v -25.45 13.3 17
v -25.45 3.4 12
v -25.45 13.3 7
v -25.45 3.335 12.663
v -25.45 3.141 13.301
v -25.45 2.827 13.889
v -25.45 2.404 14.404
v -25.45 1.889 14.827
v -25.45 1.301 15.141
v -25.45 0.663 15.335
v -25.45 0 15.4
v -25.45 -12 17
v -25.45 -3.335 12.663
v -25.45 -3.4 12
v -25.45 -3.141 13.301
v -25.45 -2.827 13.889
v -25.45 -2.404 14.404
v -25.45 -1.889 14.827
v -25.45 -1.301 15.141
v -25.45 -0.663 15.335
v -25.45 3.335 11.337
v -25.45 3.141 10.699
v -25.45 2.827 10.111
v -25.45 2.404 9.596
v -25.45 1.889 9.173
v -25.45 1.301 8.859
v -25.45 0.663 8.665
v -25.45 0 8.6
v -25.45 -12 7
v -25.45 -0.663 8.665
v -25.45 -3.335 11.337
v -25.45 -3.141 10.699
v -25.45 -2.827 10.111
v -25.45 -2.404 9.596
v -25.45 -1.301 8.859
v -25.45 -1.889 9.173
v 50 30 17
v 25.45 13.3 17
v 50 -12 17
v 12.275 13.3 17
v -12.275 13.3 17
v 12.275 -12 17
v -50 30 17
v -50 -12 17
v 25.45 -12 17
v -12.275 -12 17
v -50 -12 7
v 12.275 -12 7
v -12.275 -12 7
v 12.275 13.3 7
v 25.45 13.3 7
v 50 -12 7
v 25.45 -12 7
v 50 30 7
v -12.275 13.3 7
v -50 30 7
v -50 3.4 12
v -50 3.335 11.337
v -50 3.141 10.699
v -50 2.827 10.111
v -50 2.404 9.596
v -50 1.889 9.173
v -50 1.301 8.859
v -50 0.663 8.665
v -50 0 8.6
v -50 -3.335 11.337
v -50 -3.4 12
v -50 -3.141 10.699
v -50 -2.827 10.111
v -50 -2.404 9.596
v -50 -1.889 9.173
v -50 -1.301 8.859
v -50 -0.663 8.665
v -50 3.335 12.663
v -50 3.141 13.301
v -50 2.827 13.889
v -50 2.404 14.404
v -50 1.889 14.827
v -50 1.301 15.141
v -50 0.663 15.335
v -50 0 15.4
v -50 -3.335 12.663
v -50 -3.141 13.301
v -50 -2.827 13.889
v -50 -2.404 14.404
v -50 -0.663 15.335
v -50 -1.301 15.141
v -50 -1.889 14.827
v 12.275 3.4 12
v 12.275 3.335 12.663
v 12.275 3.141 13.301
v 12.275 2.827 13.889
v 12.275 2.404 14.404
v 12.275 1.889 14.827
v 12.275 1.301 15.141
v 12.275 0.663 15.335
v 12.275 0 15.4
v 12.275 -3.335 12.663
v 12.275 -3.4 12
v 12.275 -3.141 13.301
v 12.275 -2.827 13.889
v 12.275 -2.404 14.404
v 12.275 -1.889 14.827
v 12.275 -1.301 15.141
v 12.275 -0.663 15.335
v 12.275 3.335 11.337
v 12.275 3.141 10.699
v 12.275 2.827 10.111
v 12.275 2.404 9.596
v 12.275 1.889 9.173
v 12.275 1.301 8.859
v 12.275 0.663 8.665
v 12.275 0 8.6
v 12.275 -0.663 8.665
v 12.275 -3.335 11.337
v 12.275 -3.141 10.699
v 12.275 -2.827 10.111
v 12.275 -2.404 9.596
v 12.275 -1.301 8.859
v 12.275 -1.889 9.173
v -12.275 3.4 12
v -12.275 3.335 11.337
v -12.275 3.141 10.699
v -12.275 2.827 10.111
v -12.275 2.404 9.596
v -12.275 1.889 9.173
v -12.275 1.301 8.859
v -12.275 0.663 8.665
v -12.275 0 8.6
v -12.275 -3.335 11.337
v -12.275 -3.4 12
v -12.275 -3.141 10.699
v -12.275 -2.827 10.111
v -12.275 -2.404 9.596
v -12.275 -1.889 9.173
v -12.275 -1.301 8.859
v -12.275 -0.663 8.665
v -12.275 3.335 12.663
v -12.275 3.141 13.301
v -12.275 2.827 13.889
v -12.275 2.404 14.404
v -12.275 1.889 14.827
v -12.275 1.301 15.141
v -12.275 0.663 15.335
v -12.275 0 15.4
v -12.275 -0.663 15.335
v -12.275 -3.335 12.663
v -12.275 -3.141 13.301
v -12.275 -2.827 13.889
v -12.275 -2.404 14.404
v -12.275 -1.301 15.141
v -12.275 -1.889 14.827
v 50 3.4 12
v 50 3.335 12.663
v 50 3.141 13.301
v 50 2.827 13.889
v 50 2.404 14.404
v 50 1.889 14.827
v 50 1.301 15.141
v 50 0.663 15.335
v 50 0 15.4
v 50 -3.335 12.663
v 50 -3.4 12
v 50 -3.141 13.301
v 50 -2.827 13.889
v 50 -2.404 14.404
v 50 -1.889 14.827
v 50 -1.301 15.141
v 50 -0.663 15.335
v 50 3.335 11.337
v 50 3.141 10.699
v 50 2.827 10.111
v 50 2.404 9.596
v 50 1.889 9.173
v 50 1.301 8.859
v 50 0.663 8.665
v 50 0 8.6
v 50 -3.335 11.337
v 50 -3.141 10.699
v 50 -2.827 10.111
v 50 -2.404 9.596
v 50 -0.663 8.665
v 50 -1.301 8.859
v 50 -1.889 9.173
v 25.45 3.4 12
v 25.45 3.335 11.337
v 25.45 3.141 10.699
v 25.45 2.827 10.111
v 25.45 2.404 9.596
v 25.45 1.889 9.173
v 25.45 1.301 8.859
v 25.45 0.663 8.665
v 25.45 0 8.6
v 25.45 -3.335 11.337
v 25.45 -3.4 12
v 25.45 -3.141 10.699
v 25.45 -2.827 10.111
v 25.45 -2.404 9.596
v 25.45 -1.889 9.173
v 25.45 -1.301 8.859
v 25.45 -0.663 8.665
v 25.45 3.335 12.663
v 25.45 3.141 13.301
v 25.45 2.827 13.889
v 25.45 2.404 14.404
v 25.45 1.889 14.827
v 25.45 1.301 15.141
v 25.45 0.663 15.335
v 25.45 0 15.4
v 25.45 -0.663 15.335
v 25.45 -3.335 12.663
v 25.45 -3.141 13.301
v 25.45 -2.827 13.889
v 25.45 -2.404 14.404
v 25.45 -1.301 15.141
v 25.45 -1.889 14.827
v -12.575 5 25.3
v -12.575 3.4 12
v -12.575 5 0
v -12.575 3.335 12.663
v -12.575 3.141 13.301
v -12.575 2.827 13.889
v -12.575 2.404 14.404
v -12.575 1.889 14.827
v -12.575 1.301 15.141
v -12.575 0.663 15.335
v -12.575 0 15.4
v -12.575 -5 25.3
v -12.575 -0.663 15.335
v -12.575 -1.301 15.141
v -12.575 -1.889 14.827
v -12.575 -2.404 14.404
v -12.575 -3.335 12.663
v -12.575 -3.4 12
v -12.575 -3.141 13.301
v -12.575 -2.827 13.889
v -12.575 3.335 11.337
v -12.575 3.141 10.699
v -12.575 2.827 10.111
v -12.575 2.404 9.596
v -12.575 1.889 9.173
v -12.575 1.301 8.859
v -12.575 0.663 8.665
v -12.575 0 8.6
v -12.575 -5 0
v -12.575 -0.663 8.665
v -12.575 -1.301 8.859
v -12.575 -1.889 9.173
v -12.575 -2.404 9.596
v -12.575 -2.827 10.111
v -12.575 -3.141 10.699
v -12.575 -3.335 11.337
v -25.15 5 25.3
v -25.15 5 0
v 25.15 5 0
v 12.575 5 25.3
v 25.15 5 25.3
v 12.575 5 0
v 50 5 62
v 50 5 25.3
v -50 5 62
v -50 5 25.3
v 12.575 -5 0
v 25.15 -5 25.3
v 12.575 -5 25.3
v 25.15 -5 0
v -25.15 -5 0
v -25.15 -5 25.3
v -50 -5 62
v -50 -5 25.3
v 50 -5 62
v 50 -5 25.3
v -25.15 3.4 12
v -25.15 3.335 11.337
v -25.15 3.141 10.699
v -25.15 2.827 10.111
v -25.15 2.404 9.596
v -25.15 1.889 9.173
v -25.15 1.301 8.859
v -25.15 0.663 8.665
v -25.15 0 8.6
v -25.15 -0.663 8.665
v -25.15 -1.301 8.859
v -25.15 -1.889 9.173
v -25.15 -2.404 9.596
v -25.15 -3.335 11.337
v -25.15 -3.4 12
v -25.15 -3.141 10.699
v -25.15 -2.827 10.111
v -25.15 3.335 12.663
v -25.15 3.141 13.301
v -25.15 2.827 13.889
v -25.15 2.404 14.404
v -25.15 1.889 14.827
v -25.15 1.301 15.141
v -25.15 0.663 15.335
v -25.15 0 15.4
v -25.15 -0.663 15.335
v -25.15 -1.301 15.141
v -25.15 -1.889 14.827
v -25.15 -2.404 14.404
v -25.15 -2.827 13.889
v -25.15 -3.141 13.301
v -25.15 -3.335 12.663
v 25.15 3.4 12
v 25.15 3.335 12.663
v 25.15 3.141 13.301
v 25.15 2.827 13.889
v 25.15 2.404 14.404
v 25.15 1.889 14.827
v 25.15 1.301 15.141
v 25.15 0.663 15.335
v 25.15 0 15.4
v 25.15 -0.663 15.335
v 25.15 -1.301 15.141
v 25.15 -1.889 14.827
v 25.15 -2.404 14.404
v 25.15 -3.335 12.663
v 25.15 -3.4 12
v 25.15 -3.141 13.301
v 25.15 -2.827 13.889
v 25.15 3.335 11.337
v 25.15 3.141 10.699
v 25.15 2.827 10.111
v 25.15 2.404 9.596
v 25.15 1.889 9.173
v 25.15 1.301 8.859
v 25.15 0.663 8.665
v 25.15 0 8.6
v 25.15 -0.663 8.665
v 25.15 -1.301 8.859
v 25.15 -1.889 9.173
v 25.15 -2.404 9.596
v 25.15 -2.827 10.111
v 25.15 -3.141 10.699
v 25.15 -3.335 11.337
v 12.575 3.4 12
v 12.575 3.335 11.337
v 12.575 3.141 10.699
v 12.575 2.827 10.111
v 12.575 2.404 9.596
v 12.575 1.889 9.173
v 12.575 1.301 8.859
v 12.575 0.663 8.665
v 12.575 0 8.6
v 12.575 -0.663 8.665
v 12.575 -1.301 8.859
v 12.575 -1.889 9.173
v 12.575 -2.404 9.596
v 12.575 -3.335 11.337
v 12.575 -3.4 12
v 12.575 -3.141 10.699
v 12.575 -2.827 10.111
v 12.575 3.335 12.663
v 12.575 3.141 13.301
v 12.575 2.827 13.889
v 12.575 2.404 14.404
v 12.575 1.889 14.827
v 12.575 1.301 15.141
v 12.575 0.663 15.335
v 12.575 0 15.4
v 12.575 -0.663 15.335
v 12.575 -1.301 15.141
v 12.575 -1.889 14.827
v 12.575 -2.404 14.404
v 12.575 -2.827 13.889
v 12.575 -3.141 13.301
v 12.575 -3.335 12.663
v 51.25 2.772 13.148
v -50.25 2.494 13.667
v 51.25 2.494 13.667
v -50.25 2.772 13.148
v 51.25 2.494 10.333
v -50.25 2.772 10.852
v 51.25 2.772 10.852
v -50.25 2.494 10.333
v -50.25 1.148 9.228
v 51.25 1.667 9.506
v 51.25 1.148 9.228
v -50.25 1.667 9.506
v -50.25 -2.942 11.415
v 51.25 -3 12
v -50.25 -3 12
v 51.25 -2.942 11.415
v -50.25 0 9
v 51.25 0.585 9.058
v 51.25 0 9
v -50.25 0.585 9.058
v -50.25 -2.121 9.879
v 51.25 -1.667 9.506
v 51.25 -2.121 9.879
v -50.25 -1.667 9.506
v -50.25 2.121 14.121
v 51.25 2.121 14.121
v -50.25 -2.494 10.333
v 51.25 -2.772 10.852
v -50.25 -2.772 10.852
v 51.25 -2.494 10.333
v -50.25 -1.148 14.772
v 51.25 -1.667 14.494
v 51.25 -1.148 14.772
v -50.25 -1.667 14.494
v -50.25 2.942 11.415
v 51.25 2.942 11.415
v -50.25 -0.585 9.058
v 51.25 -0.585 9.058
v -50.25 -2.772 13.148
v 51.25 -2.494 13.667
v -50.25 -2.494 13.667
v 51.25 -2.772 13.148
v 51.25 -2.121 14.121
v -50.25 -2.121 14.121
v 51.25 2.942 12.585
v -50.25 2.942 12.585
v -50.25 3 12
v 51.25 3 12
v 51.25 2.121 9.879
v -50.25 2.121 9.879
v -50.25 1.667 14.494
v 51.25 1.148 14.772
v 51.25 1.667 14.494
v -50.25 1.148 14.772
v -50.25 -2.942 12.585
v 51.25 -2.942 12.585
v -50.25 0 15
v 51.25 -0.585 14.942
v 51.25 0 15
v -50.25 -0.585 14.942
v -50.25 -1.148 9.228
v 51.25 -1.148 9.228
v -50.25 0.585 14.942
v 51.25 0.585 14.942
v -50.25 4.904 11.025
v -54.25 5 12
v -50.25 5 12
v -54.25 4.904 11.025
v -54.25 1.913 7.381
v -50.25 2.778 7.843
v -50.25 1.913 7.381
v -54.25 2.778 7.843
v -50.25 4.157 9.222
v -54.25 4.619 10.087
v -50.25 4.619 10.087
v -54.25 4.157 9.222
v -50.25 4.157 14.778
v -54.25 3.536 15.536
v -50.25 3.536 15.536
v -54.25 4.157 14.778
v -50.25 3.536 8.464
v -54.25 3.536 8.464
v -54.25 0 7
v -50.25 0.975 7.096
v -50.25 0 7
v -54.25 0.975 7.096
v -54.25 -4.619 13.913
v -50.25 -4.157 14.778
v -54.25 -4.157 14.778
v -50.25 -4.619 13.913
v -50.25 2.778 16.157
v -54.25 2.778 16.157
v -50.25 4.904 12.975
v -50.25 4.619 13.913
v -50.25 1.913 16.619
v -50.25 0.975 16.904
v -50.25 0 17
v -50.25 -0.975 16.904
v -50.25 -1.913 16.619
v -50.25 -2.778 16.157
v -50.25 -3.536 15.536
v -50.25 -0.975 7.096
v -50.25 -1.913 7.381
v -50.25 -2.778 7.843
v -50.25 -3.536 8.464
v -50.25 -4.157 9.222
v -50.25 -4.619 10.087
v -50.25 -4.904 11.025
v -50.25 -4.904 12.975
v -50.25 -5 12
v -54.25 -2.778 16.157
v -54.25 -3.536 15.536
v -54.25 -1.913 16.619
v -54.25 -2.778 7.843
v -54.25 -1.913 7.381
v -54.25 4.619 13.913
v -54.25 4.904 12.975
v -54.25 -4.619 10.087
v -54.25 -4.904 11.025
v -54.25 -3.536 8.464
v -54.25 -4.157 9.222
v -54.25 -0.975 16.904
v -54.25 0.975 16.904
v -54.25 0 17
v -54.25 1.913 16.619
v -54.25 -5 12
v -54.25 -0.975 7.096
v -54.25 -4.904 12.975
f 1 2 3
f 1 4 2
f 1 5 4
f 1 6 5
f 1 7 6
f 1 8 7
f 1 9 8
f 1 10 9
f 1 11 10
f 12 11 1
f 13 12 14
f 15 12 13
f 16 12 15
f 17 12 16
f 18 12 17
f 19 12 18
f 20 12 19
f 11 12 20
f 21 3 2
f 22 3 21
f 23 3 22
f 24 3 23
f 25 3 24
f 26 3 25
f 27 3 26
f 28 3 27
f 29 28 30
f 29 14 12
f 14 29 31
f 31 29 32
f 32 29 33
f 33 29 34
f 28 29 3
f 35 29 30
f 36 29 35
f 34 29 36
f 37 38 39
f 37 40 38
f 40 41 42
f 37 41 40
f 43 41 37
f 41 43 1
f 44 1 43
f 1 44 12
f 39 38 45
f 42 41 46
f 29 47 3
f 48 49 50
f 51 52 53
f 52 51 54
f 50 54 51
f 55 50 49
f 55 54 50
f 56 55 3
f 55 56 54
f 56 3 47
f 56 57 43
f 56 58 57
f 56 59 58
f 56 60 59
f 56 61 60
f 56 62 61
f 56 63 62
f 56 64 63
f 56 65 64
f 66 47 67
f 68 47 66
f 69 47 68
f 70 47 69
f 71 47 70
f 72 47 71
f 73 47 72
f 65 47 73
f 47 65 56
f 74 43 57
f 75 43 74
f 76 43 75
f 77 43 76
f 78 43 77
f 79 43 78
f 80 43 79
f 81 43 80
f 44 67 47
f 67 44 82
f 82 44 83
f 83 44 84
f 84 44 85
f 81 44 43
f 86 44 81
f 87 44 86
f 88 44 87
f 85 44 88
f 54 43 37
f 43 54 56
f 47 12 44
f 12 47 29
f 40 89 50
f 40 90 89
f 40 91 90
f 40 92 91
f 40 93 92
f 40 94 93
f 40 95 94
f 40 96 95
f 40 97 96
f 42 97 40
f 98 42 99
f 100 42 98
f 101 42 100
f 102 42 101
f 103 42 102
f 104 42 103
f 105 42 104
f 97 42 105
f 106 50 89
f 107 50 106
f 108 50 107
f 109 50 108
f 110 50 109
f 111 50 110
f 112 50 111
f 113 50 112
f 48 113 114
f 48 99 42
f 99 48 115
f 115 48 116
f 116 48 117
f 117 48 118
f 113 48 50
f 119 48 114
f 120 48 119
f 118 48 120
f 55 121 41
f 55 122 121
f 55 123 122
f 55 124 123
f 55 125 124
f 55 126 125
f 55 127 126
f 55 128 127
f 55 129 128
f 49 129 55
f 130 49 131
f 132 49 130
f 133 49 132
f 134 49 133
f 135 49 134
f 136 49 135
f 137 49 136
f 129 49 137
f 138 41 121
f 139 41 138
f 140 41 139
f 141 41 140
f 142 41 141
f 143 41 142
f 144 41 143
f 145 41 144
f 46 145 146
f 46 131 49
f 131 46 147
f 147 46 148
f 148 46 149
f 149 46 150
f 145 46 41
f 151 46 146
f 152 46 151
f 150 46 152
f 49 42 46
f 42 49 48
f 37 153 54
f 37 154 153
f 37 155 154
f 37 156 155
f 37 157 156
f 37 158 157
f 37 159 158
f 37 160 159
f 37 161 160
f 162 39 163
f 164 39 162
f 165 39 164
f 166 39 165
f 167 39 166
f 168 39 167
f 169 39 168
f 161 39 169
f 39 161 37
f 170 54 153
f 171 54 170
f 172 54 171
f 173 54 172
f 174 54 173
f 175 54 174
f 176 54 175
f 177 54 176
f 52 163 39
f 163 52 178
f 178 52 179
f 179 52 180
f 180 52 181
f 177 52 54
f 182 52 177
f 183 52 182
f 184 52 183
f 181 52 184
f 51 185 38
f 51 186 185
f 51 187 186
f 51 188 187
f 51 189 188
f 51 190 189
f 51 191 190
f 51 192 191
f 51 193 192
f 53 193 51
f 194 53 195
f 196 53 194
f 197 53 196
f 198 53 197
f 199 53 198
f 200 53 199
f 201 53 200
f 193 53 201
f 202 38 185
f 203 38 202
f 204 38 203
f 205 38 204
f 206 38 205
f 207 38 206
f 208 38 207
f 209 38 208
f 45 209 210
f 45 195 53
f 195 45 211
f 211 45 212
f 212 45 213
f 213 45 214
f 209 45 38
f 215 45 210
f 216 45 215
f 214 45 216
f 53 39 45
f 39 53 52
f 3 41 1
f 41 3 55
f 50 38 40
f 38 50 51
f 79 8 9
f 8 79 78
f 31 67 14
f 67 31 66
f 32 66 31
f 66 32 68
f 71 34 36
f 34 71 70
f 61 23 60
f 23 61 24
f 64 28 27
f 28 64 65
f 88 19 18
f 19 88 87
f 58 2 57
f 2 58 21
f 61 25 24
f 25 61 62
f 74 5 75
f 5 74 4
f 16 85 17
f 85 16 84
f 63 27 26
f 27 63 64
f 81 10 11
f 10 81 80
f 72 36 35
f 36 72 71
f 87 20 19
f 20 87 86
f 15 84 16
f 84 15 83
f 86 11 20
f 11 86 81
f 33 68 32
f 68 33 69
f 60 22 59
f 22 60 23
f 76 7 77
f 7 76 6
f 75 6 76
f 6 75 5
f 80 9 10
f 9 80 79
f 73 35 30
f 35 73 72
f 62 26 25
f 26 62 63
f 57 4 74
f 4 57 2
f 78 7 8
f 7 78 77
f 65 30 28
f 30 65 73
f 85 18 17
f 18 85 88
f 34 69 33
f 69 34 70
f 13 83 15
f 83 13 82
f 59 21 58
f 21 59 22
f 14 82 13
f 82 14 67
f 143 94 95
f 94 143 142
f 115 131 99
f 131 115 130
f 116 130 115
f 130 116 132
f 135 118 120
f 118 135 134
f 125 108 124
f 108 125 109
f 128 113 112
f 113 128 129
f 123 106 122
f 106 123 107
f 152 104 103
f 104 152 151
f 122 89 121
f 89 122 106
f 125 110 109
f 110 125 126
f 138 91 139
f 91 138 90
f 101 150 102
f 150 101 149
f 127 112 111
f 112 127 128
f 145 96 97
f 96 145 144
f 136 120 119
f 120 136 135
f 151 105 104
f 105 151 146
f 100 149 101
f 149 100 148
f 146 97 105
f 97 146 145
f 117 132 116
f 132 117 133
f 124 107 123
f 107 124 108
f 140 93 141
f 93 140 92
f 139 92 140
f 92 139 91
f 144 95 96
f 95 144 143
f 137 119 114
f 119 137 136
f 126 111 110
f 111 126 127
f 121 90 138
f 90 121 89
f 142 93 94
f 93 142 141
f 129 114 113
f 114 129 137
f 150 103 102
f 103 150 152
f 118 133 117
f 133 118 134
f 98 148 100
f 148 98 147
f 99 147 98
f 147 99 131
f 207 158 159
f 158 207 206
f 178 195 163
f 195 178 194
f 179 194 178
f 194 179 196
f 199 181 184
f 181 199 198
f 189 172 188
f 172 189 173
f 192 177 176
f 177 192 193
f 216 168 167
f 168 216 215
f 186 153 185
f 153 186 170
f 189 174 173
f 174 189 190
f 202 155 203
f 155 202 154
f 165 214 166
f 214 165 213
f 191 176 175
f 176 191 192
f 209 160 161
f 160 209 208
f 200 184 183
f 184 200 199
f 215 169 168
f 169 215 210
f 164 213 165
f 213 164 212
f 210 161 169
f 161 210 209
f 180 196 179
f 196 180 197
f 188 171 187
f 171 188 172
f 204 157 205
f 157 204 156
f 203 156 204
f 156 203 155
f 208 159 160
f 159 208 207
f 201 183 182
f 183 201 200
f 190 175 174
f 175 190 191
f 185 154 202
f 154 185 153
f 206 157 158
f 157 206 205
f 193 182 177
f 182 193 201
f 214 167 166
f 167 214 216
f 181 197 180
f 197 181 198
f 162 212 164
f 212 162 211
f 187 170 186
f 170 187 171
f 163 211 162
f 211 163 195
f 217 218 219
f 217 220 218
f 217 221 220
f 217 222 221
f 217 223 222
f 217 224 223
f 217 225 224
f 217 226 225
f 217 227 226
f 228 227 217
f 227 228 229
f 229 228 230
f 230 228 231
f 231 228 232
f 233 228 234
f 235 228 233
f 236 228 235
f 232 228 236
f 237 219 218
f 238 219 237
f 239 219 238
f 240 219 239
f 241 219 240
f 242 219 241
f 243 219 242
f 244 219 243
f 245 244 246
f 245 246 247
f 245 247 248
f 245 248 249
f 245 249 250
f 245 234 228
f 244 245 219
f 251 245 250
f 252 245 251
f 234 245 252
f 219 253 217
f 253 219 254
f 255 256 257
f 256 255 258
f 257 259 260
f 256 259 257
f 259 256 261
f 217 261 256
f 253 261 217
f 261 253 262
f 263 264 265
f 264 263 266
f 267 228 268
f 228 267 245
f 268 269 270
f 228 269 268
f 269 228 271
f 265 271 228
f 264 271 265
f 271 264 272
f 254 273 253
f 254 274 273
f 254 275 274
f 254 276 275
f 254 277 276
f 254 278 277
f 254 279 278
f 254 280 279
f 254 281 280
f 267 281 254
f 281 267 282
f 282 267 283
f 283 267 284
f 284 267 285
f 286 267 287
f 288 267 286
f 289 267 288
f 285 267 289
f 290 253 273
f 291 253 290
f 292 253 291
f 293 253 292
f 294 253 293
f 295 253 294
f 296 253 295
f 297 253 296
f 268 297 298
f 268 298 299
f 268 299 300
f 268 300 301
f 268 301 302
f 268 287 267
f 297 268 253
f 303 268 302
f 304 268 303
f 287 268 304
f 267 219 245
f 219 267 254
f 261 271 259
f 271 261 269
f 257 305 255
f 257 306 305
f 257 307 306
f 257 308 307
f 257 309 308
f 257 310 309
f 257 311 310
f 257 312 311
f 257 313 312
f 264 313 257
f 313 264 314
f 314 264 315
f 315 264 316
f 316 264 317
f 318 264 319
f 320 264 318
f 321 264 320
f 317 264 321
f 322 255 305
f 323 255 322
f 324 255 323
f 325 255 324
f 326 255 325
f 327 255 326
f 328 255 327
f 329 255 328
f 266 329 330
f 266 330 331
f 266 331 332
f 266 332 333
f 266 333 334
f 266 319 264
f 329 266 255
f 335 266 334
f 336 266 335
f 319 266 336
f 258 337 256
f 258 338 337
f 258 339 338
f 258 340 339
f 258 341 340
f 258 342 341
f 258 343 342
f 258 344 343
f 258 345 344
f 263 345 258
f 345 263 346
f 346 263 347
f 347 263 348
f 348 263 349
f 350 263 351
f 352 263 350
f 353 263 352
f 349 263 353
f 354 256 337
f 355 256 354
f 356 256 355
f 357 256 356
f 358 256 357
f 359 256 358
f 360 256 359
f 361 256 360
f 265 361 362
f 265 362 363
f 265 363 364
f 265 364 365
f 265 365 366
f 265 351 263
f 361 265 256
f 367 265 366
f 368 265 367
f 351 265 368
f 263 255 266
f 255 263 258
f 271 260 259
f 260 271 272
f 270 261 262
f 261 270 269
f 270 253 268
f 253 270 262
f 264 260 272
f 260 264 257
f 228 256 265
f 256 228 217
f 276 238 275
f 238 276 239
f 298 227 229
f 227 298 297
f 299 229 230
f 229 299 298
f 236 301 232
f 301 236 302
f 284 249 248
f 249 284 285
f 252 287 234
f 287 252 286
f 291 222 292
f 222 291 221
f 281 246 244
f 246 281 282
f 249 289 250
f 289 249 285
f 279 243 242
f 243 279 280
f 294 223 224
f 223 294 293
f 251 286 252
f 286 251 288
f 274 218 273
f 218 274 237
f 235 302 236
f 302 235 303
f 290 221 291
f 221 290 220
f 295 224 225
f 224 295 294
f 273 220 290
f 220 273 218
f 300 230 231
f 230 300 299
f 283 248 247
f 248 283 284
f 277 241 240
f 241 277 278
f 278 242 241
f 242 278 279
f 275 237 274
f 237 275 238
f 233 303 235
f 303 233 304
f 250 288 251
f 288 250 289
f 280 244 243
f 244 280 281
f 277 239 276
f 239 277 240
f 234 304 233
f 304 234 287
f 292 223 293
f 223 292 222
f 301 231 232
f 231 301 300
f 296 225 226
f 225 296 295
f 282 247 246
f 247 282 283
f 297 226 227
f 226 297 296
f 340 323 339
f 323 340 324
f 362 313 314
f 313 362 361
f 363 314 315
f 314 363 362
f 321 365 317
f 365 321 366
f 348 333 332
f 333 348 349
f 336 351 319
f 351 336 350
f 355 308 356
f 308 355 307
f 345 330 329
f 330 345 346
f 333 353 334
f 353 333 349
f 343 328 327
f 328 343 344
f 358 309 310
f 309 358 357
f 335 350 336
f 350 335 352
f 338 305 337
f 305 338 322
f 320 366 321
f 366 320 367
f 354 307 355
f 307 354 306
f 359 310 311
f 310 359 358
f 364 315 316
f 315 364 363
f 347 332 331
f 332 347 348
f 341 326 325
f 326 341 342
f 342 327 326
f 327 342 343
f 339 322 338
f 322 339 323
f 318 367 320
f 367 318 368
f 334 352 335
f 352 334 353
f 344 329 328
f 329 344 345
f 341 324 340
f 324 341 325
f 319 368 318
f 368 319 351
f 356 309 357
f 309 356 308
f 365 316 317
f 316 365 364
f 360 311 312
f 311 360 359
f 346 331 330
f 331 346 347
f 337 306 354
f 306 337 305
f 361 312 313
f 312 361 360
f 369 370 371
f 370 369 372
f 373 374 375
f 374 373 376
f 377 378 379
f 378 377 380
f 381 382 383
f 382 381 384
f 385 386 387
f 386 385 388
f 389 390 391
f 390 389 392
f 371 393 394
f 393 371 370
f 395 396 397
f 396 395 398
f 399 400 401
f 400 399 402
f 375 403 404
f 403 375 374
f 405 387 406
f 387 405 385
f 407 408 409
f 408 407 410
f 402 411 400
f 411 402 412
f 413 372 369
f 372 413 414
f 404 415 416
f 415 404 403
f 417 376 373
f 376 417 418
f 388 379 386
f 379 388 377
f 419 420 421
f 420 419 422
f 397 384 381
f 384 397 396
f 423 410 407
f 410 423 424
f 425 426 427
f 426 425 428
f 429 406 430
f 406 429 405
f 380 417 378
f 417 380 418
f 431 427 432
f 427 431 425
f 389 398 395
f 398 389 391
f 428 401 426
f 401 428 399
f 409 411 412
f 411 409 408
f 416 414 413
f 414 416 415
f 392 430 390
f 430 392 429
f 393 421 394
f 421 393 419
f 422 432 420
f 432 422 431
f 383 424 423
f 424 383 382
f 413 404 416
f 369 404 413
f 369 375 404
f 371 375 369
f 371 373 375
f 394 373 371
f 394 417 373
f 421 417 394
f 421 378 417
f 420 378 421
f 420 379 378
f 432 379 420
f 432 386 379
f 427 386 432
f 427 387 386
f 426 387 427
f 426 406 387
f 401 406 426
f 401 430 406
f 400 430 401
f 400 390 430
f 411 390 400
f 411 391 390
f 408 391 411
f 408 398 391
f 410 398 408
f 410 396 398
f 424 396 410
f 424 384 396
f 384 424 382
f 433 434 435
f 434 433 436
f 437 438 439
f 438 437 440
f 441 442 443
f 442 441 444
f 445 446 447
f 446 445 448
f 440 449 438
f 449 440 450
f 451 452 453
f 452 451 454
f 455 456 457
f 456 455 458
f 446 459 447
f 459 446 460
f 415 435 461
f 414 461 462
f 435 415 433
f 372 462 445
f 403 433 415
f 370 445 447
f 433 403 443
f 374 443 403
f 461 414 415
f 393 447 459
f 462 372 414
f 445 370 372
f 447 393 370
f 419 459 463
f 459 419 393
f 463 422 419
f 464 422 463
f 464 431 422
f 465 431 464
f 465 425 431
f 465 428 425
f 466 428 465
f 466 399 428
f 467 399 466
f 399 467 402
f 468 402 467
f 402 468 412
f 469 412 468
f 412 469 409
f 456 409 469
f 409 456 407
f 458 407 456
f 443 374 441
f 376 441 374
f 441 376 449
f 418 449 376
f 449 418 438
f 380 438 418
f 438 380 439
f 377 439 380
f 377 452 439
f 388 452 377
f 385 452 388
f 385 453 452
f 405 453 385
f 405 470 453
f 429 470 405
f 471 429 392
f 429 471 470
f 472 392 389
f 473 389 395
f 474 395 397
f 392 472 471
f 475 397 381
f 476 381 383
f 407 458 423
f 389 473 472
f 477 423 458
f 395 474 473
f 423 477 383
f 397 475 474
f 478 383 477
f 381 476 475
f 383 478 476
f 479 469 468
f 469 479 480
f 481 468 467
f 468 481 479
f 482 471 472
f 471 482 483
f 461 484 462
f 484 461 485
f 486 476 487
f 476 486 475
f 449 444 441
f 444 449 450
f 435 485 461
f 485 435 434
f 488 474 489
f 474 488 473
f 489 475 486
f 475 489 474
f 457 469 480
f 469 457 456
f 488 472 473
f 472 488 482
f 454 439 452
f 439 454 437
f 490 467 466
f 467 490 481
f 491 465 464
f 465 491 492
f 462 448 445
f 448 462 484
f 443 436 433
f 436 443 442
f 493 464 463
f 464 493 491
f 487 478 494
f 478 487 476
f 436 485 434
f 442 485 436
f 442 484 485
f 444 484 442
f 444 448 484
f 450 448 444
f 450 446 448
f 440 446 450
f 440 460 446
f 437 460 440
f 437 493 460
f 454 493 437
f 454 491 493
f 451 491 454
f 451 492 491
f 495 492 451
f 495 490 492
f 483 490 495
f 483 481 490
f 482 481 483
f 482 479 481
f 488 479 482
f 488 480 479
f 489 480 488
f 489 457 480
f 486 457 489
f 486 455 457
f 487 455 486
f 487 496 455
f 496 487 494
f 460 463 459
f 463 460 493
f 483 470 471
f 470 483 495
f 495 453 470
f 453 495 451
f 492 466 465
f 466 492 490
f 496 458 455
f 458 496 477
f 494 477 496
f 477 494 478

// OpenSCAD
$fn = 32;

// ------------------------------------------------------------------------
// Butt hinge: hinge 100 mm, leaf swung 270 deg
// Every part is its own module, assembly() places every instance.
// ------------------------------------------------------------------------

// --- part 1 ---
module hinge_base() {
  difference() {
    union() {
      translate([-50, -12, -5]) cube([24.55, 42, 10]);
      translate([-12.275, -12, -5]) cube([24.55, 42, 10]);
      translate([25.45, -12, -5]) cube([24.55, 42, 10]);
      translate([-50, 13.3, -5]) cube([100, 16.7, 10]);
    }
    translate([-37.725, 0, 0]) rotate([0, 90, 0]) cylinder(h = 26.55, d = 6.8, center = true);
    translate([0, 0, 0]) rotate([0, 90, 0]) cylinder(h = 26.55, d = 6.8, center = true);
    translate([37.725, 0, 0]) rotate([0, 90, 0]) cylinder(h = 26.55, d = 6.8, center = true);
  }
}

// --- part 2 ---
module hinge_mover() {
  difference() {
    union() {
      translate([-25.15, -50, -5]) cube([12.575, 62, 10]);
      translate([12.575, -50, -5]) cube([12.575, 62, 10]);
      translate([-50, -50, -5]) cube([100, 36.7, 10]);
    }
    translate([-18.863, 0, 0]) rotate([0, 90, 0]) cylinder(h = 14.575, d = 6.8, center = true);
    translate([18.863, 0, 0]) rotate([0, 90, 0]) cylinder(h = 14.575, d = 6.8, center = true);
  }
}

// --- part 3 ---
module hinge_pin() {
  rotate([0, 90, 0]) cylinder(h = 102.5, d = 6, center = true);
  translate([-54.25, 0, 0]) rotate([0, 90, 0]) cylinder(h = 4, d = 10);
}

// --- assembly ---
module assembly() {
  color([0.80, 0.24, 0.20]) translate([0, 0, 12]) rotate([0, 0, 0]) hinge_base();
  color([0.20, 0.45, 0.75]) translate([0, 0, 12]) rotate([270, 0, 0]) hinge_mover();
  color([0.25, 0.62, 0.32]) translate([0, 0, 12]) rotate([0, 0, 0]) hinge_pin();
}

assembly();
